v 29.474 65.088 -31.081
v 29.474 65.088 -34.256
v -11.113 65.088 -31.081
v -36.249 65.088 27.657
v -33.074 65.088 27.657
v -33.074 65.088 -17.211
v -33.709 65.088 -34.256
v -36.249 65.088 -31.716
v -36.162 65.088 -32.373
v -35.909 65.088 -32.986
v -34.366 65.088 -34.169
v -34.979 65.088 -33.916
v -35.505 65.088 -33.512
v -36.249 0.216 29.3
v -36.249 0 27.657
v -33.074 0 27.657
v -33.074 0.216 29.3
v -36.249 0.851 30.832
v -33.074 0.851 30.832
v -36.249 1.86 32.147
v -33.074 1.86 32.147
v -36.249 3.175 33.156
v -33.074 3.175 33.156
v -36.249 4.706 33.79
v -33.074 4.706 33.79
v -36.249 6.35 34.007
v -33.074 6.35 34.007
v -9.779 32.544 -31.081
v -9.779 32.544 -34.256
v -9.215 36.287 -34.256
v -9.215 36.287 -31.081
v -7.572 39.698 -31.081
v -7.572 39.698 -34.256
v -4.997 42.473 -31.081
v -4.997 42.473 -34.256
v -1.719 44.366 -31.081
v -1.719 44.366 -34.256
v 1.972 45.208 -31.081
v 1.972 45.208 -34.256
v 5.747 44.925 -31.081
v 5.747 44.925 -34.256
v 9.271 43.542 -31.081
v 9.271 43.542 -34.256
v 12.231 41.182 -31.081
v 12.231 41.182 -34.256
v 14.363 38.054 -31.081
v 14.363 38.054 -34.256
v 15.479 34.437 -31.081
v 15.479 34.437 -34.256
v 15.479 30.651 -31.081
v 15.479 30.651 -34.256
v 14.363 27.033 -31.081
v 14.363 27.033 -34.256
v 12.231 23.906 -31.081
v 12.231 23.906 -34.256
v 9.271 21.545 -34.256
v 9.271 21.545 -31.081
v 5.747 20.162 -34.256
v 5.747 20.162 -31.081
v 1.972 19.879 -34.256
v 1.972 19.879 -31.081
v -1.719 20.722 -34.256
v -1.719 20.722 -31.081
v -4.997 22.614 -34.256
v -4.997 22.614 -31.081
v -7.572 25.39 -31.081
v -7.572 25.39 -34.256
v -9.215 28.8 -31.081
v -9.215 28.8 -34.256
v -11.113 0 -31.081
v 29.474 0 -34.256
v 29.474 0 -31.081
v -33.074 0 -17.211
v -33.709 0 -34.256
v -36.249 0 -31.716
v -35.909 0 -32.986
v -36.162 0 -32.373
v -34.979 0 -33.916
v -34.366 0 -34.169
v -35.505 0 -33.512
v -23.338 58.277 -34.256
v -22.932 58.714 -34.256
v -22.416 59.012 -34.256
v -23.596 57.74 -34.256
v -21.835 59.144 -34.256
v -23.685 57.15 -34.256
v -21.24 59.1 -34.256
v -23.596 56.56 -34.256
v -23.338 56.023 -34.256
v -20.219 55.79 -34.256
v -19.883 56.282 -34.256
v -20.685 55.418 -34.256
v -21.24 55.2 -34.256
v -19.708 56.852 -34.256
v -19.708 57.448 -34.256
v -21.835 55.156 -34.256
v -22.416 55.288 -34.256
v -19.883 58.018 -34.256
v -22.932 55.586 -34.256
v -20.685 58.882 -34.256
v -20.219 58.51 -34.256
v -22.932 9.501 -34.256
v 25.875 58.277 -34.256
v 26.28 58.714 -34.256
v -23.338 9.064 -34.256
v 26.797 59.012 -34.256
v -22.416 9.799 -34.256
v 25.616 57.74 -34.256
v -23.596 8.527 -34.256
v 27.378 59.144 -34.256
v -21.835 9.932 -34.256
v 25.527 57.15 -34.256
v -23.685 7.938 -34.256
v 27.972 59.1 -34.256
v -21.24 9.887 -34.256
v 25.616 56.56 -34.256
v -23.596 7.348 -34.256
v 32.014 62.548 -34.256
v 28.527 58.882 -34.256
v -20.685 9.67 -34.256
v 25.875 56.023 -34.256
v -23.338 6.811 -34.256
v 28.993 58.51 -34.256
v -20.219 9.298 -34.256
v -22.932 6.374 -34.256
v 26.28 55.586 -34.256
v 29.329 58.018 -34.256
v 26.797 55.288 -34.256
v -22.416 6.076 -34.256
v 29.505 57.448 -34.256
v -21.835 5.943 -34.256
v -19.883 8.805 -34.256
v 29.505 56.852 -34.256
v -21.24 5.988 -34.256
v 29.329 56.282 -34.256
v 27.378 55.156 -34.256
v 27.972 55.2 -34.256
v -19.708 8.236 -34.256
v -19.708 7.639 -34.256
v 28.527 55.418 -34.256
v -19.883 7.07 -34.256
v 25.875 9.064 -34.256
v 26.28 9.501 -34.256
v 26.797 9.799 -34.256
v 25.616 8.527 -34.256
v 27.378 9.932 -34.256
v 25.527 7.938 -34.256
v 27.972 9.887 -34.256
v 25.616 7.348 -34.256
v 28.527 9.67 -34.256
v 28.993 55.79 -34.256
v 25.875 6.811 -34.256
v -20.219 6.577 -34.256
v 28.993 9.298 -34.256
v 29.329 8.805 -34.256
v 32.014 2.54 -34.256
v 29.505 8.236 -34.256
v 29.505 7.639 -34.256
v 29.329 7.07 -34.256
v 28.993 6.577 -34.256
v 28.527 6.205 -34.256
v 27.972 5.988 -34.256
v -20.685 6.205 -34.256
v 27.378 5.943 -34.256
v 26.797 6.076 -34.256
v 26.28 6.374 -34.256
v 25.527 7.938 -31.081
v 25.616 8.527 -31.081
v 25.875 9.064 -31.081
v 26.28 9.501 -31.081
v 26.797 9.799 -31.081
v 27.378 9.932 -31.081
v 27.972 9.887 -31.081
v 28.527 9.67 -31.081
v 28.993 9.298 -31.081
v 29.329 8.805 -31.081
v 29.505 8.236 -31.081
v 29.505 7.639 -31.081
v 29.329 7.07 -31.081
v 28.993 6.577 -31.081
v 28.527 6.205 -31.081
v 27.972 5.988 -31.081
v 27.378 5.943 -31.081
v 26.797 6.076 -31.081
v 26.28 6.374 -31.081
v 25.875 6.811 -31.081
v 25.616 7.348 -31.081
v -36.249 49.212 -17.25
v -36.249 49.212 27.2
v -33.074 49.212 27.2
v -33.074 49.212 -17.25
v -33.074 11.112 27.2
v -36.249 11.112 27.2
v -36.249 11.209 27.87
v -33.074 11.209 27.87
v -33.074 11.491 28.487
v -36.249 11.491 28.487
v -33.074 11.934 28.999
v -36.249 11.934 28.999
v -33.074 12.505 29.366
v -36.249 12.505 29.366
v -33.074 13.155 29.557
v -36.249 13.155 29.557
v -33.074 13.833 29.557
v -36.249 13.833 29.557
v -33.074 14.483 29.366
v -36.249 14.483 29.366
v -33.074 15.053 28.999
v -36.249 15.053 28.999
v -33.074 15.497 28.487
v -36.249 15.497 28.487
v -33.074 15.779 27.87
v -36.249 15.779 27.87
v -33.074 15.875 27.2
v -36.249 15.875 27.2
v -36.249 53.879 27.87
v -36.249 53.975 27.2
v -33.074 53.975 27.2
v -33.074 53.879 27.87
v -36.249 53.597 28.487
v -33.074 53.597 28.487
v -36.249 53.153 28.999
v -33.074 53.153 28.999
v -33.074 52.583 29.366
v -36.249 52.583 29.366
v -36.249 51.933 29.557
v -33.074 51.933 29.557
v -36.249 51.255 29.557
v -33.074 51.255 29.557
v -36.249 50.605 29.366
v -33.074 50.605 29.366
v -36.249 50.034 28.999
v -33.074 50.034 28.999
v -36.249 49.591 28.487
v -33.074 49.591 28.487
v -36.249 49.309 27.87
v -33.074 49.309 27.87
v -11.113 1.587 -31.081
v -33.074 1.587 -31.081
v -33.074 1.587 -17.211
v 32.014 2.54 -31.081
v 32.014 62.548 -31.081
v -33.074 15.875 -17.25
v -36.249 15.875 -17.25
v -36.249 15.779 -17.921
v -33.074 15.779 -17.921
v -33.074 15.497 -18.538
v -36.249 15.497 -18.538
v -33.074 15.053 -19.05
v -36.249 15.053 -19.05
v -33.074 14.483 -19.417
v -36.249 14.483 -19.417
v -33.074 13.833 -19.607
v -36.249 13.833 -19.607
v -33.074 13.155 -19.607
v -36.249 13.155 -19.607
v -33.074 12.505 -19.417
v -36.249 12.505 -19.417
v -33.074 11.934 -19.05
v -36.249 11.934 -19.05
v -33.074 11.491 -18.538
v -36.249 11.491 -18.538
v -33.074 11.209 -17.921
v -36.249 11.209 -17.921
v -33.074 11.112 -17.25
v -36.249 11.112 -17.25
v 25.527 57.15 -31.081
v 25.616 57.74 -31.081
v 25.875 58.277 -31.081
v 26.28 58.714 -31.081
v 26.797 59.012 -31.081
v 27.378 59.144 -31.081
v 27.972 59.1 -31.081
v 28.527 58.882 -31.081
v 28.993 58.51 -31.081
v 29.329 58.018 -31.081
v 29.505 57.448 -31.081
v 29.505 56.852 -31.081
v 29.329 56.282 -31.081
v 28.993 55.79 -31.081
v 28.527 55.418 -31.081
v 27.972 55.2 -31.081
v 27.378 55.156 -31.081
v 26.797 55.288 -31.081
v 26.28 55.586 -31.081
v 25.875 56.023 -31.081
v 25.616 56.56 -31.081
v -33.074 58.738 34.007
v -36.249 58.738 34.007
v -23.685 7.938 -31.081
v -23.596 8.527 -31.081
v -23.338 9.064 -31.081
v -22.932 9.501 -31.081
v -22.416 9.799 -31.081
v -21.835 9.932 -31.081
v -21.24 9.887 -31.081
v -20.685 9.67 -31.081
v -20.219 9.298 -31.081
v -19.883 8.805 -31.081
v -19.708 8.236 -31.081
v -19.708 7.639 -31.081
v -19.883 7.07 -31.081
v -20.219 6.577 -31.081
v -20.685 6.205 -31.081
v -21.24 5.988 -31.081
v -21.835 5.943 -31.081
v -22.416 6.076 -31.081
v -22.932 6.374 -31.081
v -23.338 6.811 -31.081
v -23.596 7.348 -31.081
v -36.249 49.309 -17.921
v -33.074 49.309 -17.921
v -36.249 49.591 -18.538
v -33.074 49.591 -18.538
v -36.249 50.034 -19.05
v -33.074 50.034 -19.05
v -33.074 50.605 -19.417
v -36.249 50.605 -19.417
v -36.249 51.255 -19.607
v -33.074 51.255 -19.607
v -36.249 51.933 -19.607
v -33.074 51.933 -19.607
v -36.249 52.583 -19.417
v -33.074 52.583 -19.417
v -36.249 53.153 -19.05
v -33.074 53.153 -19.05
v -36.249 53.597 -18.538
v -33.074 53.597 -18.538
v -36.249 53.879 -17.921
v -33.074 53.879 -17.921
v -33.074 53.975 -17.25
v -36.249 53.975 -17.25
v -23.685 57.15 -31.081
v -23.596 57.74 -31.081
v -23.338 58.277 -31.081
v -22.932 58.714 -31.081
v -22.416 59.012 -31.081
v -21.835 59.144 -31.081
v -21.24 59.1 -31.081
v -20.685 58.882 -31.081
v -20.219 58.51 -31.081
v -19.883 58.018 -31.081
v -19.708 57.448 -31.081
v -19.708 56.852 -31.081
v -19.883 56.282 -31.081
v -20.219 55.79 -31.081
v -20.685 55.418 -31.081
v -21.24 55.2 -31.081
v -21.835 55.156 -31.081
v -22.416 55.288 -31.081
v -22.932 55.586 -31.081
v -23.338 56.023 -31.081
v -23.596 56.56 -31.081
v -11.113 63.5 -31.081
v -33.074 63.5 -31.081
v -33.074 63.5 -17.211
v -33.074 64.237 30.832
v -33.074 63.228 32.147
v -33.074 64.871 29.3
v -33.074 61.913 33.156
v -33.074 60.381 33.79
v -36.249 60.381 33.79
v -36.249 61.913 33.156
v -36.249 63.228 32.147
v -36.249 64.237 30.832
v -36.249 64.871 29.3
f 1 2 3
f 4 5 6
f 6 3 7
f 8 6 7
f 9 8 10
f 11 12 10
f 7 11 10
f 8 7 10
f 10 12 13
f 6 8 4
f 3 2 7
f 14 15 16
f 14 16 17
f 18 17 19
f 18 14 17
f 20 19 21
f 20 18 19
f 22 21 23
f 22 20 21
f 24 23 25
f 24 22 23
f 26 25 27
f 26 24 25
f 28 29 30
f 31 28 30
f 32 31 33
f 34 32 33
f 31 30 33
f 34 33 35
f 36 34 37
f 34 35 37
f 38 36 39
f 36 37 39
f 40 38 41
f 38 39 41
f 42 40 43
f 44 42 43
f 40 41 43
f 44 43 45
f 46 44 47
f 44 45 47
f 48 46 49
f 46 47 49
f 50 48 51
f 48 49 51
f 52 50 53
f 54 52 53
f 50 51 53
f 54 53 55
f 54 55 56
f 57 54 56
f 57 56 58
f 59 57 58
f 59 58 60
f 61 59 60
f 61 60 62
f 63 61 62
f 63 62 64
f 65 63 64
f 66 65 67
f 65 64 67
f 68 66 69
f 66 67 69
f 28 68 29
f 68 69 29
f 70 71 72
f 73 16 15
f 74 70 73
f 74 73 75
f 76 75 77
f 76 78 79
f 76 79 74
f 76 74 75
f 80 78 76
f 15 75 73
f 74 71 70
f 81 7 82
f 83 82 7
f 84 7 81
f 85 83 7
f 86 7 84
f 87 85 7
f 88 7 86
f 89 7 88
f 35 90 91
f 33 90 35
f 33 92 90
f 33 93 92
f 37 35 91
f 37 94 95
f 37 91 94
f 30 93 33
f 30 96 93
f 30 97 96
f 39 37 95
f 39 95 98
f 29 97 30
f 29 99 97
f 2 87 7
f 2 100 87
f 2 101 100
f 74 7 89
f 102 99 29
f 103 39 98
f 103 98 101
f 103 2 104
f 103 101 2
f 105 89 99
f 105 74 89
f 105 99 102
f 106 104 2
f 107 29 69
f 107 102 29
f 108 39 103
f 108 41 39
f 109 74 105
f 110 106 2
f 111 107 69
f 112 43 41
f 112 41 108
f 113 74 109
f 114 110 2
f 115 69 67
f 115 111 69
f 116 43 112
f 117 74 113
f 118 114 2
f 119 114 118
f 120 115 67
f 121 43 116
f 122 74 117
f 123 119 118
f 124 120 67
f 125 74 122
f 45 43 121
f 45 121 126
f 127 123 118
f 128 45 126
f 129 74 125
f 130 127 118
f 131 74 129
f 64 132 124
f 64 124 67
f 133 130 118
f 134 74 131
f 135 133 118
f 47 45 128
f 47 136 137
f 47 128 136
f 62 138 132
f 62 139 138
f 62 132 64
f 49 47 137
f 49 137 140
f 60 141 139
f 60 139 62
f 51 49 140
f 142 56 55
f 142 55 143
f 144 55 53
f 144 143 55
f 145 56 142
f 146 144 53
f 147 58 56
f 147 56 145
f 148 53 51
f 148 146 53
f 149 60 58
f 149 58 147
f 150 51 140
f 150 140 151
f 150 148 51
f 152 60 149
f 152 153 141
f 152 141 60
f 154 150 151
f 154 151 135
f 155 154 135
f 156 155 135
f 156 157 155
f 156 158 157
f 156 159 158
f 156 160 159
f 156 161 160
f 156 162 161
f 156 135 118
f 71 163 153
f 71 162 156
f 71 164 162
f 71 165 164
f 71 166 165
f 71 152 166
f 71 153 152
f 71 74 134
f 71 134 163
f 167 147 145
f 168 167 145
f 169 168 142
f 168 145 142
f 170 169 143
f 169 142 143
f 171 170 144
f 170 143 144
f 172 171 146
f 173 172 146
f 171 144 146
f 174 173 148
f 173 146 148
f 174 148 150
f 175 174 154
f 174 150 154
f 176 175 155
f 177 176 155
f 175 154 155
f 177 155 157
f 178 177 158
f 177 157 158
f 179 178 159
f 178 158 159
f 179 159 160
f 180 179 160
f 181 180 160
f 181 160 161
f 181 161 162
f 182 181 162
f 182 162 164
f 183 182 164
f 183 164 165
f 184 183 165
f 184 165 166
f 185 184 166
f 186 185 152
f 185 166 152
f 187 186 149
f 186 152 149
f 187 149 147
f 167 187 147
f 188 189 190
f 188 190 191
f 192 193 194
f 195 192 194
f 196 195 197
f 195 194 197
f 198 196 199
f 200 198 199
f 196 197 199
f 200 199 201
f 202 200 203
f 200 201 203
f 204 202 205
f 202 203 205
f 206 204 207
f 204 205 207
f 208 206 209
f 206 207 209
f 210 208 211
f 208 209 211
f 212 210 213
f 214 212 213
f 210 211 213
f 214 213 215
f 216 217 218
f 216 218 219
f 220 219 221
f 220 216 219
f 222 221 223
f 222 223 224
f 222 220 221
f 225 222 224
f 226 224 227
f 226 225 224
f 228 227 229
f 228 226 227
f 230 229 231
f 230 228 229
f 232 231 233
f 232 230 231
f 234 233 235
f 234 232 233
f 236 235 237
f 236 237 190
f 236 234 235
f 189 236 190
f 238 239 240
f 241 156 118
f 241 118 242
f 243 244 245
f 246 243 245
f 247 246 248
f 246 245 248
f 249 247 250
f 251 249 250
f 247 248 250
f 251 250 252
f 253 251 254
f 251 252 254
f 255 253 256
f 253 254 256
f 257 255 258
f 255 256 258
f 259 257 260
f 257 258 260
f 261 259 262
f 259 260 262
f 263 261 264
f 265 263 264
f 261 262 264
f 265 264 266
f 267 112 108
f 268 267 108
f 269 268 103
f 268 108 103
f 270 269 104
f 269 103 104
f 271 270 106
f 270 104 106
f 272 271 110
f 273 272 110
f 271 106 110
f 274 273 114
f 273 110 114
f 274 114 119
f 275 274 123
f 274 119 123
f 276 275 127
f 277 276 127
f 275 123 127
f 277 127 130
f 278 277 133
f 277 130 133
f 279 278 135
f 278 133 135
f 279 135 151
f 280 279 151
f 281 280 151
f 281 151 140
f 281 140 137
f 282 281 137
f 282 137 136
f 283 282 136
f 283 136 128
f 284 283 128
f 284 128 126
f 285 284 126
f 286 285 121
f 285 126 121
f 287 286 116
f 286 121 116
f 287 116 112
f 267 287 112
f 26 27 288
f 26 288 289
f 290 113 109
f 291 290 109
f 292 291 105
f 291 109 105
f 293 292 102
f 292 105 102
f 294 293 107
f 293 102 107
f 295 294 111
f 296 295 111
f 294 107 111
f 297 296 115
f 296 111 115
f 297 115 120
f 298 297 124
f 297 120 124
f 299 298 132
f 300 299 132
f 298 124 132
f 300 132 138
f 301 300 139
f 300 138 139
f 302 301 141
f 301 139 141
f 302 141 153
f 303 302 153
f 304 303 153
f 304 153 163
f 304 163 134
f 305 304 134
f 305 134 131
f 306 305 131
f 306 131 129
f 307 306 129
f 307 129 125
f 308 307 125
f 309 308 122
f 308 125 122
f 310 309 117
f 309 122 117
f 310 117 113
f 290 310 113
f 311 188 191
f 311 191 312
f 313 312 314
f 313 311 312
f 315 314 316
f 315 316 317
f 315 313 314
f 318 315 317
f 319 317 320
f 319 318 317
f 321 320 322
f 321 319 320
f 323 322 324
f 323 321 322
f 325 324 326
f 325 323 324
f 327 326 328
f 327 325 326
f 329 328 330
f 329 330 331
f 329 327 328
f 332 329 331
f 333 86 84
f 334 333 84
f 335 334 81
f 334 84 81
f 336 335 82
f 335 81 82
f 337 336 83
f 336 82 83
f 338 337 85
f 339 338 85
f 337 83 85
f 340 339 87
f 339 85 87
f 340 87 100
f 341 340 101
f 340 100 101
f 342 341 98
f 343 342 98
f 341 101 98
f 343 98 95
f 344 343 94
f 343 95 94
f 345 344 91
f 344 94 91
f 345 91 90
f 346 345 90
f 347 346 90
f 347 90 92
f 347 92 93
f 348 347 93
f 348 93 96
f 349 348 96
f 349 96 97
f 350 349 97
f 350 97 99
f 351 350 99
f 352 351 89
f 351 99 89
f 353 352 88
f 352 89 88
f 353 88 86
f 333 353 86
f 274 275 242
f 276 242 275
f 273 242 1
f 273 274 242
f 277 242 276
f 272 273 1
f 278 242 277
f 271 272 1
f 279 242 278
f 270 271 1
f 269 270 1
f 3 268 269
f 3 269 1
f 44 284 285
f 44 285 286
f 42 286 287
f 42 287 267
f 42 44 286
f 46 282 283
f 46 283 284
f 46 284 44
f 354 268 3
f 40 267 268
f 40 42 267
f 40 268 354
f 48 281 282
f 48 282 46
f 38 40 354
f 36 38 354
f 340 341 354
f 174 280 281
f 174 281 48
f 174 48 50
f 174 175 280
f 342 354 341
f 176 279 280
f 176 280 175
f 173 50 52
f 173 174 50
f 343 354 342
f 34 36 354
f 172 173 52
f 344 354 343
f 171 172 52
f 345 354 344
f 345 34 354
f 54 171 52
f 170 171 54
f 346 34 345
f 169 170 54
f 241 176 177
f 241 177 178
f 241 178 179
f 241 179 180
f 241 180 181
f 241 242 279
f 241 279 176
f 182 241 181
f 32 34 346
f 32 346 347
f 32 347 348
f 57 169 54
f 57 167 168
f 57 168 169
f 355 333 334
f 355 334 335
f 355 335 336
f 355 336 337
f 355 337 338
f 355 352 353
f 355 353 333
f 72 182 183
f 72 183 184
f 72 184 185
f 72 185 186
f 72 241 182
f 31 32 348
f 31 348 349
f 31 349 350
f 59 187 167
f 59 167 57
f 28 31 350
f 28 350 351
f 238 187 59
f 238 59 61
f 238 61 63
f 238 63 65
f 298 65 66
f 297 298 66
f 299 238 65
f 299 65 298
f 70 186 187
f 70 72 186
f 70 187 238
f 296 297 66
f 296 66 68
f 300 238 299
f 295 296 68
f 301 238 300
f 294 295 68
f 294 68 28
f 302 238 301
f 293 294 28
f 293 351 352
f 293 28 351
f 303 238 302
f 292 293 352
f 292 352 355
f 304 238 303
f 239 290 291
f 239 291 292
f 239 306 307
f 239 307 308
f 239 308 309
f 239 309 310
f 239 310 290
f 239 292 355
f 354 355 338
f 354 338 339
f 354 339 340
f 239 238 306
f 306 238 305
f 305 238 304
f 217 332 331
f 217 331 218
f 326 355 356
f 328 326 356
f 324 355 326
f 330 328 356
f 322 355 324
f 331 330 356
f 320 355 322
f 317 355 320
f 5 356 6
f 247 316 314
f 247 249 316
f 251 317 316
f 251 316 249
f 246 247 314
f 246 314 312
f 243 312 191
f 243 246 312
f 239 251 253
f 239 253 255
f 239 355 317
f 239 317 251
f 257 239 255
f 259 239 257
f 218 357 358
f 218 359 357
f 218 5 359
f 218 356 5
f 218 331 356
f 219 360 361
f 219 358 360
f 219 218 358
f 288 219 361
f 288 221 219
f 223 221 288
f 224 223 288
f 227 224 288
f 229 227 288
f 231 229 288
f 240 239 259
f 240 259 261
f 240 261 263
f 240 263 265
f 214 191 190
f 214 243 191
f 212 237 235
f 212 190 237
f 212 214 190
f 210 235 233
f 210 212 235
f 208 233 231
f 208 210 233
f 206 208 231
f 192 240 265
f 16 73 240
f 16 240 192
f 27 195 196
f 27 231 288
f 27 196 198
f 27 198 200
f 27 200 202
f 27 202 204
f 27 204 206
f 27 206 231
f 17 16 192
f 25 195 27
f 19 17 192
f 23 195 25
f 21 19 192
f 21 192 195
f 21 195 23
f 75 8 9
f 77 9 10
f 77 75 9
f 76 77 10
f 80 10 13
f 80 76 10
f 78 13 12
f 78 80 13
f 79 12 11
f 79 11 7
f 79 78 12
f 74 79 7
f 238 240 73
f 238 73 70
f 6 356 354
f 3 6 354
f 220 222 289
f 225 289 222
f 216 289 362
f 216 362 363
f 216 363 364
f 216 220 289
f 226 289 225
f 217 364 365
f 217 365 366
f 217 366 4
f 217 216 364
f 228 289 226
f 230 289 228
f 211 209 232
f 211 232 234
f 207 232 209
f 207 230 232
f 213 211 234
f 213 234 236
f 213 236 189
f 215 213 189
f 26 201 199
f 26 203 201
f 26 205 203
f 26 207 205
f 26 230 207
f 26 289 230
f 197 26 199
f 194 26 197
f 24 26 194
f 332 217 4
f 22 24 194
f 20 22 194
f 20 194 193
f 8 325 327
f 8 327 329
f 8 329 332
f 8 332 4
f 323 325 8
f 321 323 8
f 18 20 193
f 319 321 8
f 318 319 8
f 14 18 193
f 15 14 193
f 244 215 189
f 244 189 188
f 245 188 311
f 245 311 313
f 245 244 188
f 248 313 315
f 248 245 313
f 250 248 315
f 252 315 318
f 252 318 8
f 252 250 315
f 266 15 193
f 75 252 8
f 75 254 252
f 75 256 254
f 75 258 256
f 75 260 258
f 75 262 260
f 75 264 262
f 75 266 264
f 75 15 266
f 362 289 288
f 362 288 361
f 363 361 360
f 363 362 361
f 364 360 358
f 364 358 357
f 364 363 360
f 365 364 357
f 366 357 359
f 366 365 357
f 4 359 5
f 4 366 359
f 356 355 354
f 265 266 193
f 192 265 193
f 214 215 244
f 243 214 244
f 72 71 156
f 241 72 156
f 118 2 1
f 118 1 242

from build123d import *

# Parameters (mm, degrees)
BOSS_EXTRUDE1_DEPTH = 65.0875
SKETCH2_R           = 2
SKETCH2_R_2         = 12.7
CUT_EXTRUDE1_DEPTH  = 3.175
CUT_EXTRUDE2_DEPTH  = 3.175
BOSS_EXTRUDE2_START = -1.5875
BOSS_EXTRUDE2_DEPTH = 1.5875
CUT_EXTRUDE3_DEPTH  = 3.175


with BuildPart() as part:
    # Sketch1 → Boss-Extrude1 (new body)
    with BuildSketch(Plane(origin=(0, 0, 0), x_dir=(1, 0, 0), z_dir=(0, 1, 0))):
        with BuildLine():
            Line((32.013617701, 34.255816606), (32.013617701, 31.080816606))
            Line((32.013617701, 31.080816606), (-33.073882299, 31.080816606))
            Line((-33.073882299, 31.080816606), (-33.073882299, -34.006683394))
            Line((-33.073882299, -34.006683394), (-36.248882299, -34.006683394))
            Line((-36.248882299, -34.006683394), (-36.248882299, 31.715816606))
            ThreePointArc((-36.248882299, 31.715816606), (-35.504933523, 33.51186783), (-33.708882299, 34.255816606))
            Line((-33.708882299, 34.255816606), (32.013617701, 34.255816606))
        make_face()
    extrude(amount=BOSS_EXTRUDE1_DEPTH)

    # Sketch2 → Cut-Extrude1 (cut)
    with BuildSketch(Plane(origin=(0, 0, -34.255816606), x_dir=(-1, 0, 0), z_dir=(0, 0, -1))):
        with Locations((-27.52729049, 57.15)):
            Circle(SKETCH2_R)
        with Locations((21.68520951, 57.15)):
            Circle(SKETCH2_R)
        with Locations((21.68520951, 7.9375)):
            Circle(SKETCH2_R)
        with Locations((-27.52729049, 7.9375)):
            Circle(SKETCH2_R)
        with Locations((-2.92104049, 32.54375)):
            Circle(SKETCH2_R_2)
        Polygon((-29.473617701, 65.0875), (-32.013617701, 62.5475), (-32.013617701, 65.0875), align=None)
        Polygon((-29.473617701, 0), (-32.013617701, 2.54), (-32.013617701, 0), align=None)
    extrude(amount=-CUT_EXTRUDE1_DEPTH, mode=Mode.SUBTRACT)

    # Sketch3 → Cut-Extrude2 (cut)
    with BuildSketch(Plane.ZY.offset(36.248882299)):
        with BuildLine():
            Line((27.656683394, 65.0875), (34.006683394, 65.0875))
            Line((34.006683394, 65.0875), (34.006683394, 58.7375))
            ThreePointArc((34.006683394, 58.7375), (32.146811455, 63.227628061), (27.656683394, 65.0875))
        make_face()
        with BuildLine():
            Line((34.006683394, 6.35), (34.006683394, 0))
            Line((34.006683394, 0), (27.656683394, 0))
            ThreePointArc((27.656683394, 0), (32.146811455, 1.859871939), (34.006683394, 6.35))
        make_face()
    extrude(amount=-CUT_EXTRUDE2_DEPTH, mode=Mode.SUBTRACT)

    # Sketch4 → Boss-Extrude2 (add)
    with BuildSketch(Plane(origin=(0, 65.0875, 0), x_dir=(1, 0, 0), z_dir=(0, 1, 0)).offset(BOSS_EXTRUDE2_START)):
        with BuildLine():
            Line((-36.248882299, 31.715816606), (-36.248882299, 15.205816606))
            Line((-36.248882299, 15.205816606), (-6.086382299, 34.255816606))
            Line((-6.086382299, 34.255816606), (-33.708882299, 34.255816606))
            ThreePointArc((-33.708882299, 34.255816606), (-35.504933523, 33.51186783), (-36.248882299, 31.715816606))
        make_face()
    boss_extrude2 = extrude(amount=BOSS_EXTRUDE2_DEPTH)

    # Mirror1: Boss-Extrude2 across plane
    add(boss_extrude2.mirror(Plane(origin=(0, 32.54375, 0), x_dir=(0, 0, 1), z_dir=(0, -1, 0))))

    # Sketch5 → Cut-Extrude3 (cut)
    with BuildSketch(Plane.ZY.offset(36.248882299)):
        with BuildLine():
            Line((-17.250449478, 53.975), (27.199550522, 53.975))
            ThreePointArc((27.199550522, 53.975), (29.580800522, 51.59375), (27.199550522, 49.2125))
            Line((27.199550522, 49.2125), (-17.250449478, 49.2125))
            ThreePointArc((-17.250449478, 49.2125), (-19.631699478, 51.59375), (-17.250449478, 53.975))
        make_face()
        with BuildLine():
            Line((-17.250449478, 11.1125), (27.199550522, 11.1125))
            ThreePointArc((27.199550522, 11.1125), (29.580800522, 13.49375), (27.199550522, 15.875))
            Line((27.199550522, 15.875), (-17.250449478, 15.875))
            ThreePointArc((-17.250449478, 15.875), (-19.631699478, 13.49375), (-17.250449478, 11.1125))
        make_face()
    extrude(amount=-CUT_EXTRUDE3_DEPTH, mode=Mode.SUBTRACT)


solid = part.part
